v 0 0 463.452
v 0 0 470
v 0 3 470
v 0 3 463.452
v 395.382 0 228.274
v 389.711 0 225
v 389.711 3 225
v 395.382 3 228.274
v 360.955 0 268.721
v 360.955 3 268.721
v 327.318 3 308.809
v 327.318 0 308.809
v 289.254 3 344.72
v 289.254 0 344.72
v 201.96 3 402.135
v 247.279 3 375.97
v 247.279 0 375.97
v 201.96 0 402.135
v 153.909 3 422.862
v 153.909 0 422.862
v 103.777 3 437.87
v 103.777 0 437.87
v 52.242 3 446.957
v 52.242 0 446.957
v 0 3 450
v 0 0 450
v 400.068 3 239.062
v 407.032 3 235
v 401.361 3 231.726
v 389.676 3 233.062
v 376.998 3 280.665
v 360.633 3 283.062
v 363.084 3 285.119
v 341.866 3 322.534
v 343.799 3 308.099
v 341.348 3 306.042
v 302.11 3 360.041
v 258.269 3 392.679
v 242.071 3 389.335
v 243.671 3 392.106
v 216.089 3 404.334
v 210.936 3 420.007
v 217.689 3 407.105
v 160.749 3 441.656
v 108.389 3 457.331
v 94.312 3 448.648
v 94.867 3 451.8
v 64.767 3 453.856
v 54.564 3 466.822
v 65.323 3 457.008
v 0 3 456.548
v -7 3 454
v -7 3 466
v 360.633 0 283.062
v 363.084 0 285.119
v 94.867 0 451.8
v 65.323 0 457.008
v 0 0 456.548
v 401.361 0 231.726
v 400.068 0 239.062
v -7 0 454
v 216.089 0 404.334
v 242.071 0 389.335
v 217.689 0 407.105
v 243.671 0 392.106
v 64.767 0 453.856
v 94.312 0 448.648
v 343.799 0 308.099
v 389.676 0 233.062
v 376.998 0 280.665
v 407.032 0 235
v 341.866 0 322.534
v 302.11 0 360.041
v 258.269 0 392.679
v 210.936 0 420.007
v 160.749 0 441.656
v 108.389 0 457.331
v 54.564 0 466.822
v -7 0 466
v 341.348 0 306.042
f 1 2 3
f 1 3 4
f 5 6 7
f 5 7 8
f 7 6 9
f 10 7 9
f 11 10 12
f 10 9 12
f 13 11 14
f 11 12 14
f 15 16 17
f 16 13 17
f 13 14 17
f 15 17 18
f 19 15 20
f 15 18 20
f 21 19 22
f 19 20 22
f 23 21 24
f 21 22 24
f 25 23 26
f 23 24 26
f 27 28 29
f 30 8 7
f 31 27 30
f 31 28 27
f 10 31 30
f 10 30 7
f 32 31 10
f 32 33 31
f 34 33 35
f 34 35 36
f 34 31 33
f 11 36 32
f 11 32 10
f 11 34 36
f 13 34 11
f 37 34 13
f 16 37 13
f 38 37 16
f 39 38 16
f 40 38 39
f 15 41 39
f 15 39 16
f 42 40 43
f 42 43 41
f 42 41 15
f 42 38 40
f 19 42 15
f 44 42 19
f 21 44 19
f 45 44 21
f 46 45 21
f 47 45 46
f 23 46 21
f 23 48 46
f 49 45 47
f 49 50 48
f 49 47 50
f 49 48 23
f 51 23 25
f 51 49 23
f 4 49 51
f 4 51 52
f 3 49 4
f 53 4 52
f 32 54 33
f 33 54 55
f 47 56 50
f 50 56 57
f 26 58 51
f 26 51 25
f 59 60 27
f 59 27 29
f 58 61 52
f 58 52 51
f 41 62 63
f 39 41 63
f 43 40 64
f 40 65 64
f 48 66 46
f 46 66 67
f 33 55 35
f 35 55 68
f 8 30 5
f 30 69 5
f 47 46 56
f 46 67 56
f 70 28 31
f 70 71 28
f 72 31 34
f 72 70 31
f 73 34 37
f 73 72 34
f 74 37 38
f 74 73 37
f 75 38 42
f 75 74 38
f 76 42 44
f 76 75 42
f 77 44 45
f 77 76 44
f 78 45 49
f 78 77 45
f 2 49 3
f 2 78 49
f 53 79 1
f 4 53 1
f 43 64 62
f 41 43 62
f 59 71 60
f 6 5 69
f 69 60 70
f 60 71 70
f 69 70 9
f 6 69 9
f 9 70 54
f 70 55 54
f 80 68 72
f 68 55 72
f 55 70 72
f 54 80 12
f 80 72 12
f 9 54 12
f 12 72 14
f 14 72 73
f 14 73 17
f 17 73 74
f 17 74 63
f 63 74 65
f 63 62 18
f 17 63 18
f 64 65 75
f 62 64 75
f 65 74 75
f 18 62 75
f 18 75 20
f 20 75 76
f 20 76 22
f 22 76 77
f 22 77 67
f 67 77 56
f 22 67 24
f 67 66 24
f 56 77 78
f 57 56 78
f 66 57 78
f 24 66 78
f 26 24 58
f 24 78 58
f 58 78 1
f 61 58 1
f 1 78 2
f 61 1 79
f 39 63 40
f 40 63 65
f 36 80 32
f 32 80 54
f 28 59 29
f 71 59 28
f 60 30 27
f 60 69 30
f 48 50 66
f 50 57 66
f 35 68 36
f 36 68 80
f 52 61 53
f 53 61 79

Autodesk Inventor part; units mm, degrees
ref_plane "YZ Plane" through (0, 0, 0) normal (1, 0, 0) x (0, 1, 0)
ref_plane "XZ Plane" through (0, 0, 0) normal (0, 1, 0) x (-1, 0, 0)
ref_plane "XY Plane" through (0, 0, 0) normal (0, 0, 1) x (1, 0, 0)
sketch "Sketch1" plane through (0, 0, 0) normal (0, 1, 0) x (-1, 0, 0)
  circle A0 centre (0, 0) radius 450
  circle A1 centre (0, 0) radius 470
  line L0 (470, 0) -> (450, 0)
  line L1 (-470, 0) -> (-450, 0)
  line L2 (0, 0) -> (-389.7114, 225) construction
  line L3 (0, 450) -> (0, 0) construction
  line L4 (0, 470) -> (0, 450)
  line L5 (-389.7114, 225) -> (-407.0319, 235)
  line L6 (-389.6755, 233.0622) -> (-400.0678, 239.0622)
  line L7 (-400.0678, 239.0622) -> (-401.3614, 231.7261)
  line L8 (-389.6755, 233.0622) -> (-395.382, 228.2739)
  line L9 (-398.3717, 230) -> (-394.8717, 236.0622) construction
  line L10 (7, 454) -> (0, 456.5478)
  line L11 (7, 454) -> (7, 466)
  line L12 (7, 466) -> (0, 463.4522)
  line L13 (396.6755, 220.9378) -> (395.382, 228.2739)
  line L14 (396.6755, 220.9378) -> (407.0678, 226.9378)
  line L15 (407.0678, 226.9378) -> (401.3614, 231.7261)
  line L16 (389.6755, -233.0622) -> (395.382, -228.2739)
  line L17 (389.6755, -233.0622) -> (400.0678, -239.0622)
  line L18 (400.0678, -239.0622) -> (401.3614, -231.7261)
  line L19 (-7, -454) -> (0, -456.5478)
  line L20 (-7, -454) -> (-7, -466)
  line L21 (-7, -466) -> (0, -463.4522)
  line L22 (-396.6755, -220.9378) -> (-395.382, -228.2739)
  line L23 (-396.6755, -220.9378) -> (-407.0678, -226.9378)
  line L24 (-407.0678, -226.9378) -> (-401.3614, -231.7261)
  line L25 (-363.084, 285.1192) -> (-343.7989, 308.0994)
  line L26 (-343.7989, 308.0994) -> (-341.3477, 306.0423)
  line L27 (-341.3477, 306.0423) -> (-360.6327, 283.0622)
  line L28 (-360.6327, 283.0622) -> (-363.084, 285.1192)
  line L29 (-363.084, 285.1192) -> (-341.3477, 306.0423) construction
  line L30 (-343.7989, 308.0994) -> (-360.6327, 283.0622) construction
  circle A2 centre (0, 0) radius 460.0533 construction
  line L31 (-435.6969, 142.6478) -> (-438.7038, 143.7424)
  line L32 (-438.7038, 143.7424) -> (-428.4415, 171.9326)
  line L33 (-425.4346, 170.8379) -> (-435.6969, 142.6478)
  line L34 (-428.4415, 171.9326) -> (-425.4346, 170.8379)
  line L35 (-458.2096, -14.9721) -> (-461.4096, -14.9719)
  line L36 (-461.4096, -14.9719) -> (-461.4077, 15.0281)
  line L37 (-458.2077, 15.0279) -> (-458.2096, -14.9721)
  line L38 (-461.4077, 15.0281) -> (-458.2077, 15.0279)
  line L39 (-425.4554, -170.786) -> (-428.4625, -171.8803)
  line L40 (-428.4625, -171.8803) -> (-438.7214, -143.6889)
  line L41 (-435.7143, -142.5946) -> (-425.4554, -170.786)
  line L42 (-438.7214, -143.6889) -> (-435.7143, -142.5946)
  line L43 (-341.385, -306.0007) -> (-343.8365, -308.0575)
  line L44 (-343.8365, -308.0575) -> (-363.1187, -285.075)
  line L45 (-360.6673, -283.0182) -> (-341.385, -306.0007)
  line L46 (-363.1187, -285.075) -> (-360.6673, -283.0182)
  line L47 (-216.1386, -404.3072) -> (-217.7388, -407.0783)
  line L48 (-217.7388, -407.0783) -> (-243.7186, -392.0768)
  line L49 (-242.1185, -389.3056) -> (-216.1386, -404.3072)
  line L50 (-243.7186, -392.0768) -> (-242.1185, -389.3056)
  line L51 (-64.8227, -453.8482) -> (-65.3785, -456.9996)
  line L52 (-65.3785, -456.9996) -> (-94.9224, -451.7883)
  line L53 (-94.3666, -448.637) -> (-64.8227, -453.8482)
  line L54 (-94.9224, -451.7883) -> (-94.3666, -448.637)
  line L55 (94.3118, -448.6485) -> (94.8673, -451.7999)
  line L56 (94.8673, -451.7999) -> (65.3228, -457.0075)
  line L57 (64.7673, -453.8561) -> (94.3118, -448.6485)
  line L58 (65.3228, -457.0075) -> (64.7673, -453.8561)
  line L59 (242.071, -389.3351) -> (243.6708, -392.1065)
  line L60 (243.6708, -392.1065) -> (217.6891, -407.1049)
  line L61 (216.0893, -404.3335) -> (242.071, -389.3351)
  line L62 (217.6891, -407.1049) -> (216.0893, -404.3335)
  line L63 (360.6327, -283.0622) -> (363.084, -285.1192)
  line L64 (363.084, -285.1192) -> (343.7989, -308.0994)
  line L65 (341.3477, -306.0423) -> (360.6327, -283.0622)
  line L66 (343.7989, -308.0994) -> (341.3477, -306.0423)
  line L67 (435.6969, -142.6478) -> (438.7038, -143.7424)
  line L68 (438.7038, -143.7424) -> (428.4415, -171.9326)
  line L69 (425.4346, -170.8379) -> (435.6969, -142.6478)
  line L70 (428.4415, -171.9326) -> (425.4346, -170.8379)
  line L71 (458.2096, 14.9721) -> (461.4096, 14.9719)
  line L72 (461.4096, 14.9719) -> (461.4077, -15.0281)
  line L73 (458.2077, -15.0279) -> (458.2096, 14.9721)
  line L74 (461.4077, -15.0281) -> (458.2077, -15.0279)
  line L75 (425.4554, 170.786) -> (428.4625, 171.8803)
  line L76 (428.4625, 171.8803) -> (438.7214, 143.6889)
  line L77 (435.7143, 142.5946) -> (425.4554, 170.786)
  line L78 (438.7214, 143.6889) -> (435.7143, 142.5946)
  line L79 (341.385, 306.0007) -> (343.8365, 308.0575)
  line L80 (343.8365, 308.0575) -> (363.1187, 285.075)
  line L81 (360.6673, 283.0182) -> (341.385, 306.0007)
  line L82 (363.1187, 285.075) -> (360.6673, 283.0182)
  line L83 (216.1386, 404.3072) -> (217.7388, 407.0783)
  line L84 (217.7388, 407.0783) -> (243.7186, 392.0768)
  line L85 (242.1185, 389.3056) -> (216.1386, 404.3072)
  line L86 (243.7186, 392.0768) -> (242.1185, 389.3056)
  line L87 (64.8227, 453.8482) -> (65.3785, 456.9996)
  line L88 (65.3785, 456.9996) -> (94.9224, 451.7883)
  line L89 (94.3666, 448.637) -> (64.8227, 453.8482)
  line L90 (94.9224, 451.7883) -> (94.3666, 448.637)
  line L91 (-94.3118, 448.6485) -> (-94.8673, 451.7999)
  line L92 (-94.8673, 451.7999) -> (-65.3228, 457.0075)
  line L93 (-64.7673, 453.8561) -> (-94.3118, 448.6485)
  line L94 (-65.3228, 457.0075) -> (-64.7673, 453.8561)
  line L95 (-242.071, 389.3351) -> (-243.6708, 392.1065)
  line L96 (-243.6708, 392.1065) -> (-217.6891, 407.1049)
  line L97 (-216.0893, 404.3335) -> (-242.071, 389.3351)
  line L98 (-217.6891, 407.1049) -> (-216.0893, 404.3335)
  point P0 (460, 0)
  point P1 (-460, 0)
  point P2 (7, 460)
  point P3 (401.8717, 223.9378)
  point P4 (394.8717, -236.0622)
  point P5 (-7, -460)
  point P6 (-401.8717, -223.9378)
  point P7 (-352.2158, 295.5808)
  point P8 (7, 460)
  point P9 (-361.8584, 284.0907)
  point P10 (-342.5733, 307.0709)
  point P11 (-437.2004, 143.1951)
  point P12 (-426.938, 171.3853)
  point P13 (-459.8096, -14.972)
  point P14 (-459.8077, 15.028)
  point P15 (-426.959, -171.3332)
  point P16 (-437.2178, -143.1418)
  point P17 (-342.6108, -307.0291)
  point P18 (-361.893, -284.0466)
  point P19 (-216.9387, -405.6927)
  point P20 (-242.9185, -390.6912)
  point P21 (-65.1006, -455.4239)
  point P22 (-94.6445, -450.2126)
  point P23 (94.5896, -450.2242)
  point P24 (65.045, -455.4318)
  point P25 (242.8709, -390.7208)
  point P26 (216.8892, -405.7192)
  point P27 (361.8584, -284.0907)
  point P28 (342.5733, -307.0709)
  point P29 (437.2004, -143.1951)
  point P30 (426.938, -171.3853)
  point P31 (459.8096, 14.972)
  point P32 (459.8077, -15.028)
  point P33 (426.959, 171.3332)
  point P34 (437.2178, 143.1418)
  point P35 (342.6108, 307.0291)
  point P36 (361.893, 284.0466)
  point P37 (216.9387, 405.6927)
  point P38 (242.9185, 390.6912)
  point P39 (65.1006, 455.4239)
  point P40 (94.6445, 450.2126)
  point P41 (-94.5896, 450.2242)
  point P42 (-65.045, 455.4318)
  point P43 (-242.8709, 390.7208)
  point P44 (-216.8892, 405.7192)
  dimension "d0" = 900
  dimension "d1" = 940
  dimension "d4" = 60
  dimension "d5" = 7
  dimension "d6" = 70
  dimension "d8" = 12
  dimension "d11" = 360
  dimension "d13" = 3.2
  dimension "d14" = 30
  dimension "d15" = 50
  dimension "d18" = 360
extrude "Extrusion1" add sketch "Sketch1" along normal blind 3 contours A0 L5 L8 L6 L7 A1 L4 | L4 L12 L11 L10
properties part number "D90_CM_CIRCULO"
